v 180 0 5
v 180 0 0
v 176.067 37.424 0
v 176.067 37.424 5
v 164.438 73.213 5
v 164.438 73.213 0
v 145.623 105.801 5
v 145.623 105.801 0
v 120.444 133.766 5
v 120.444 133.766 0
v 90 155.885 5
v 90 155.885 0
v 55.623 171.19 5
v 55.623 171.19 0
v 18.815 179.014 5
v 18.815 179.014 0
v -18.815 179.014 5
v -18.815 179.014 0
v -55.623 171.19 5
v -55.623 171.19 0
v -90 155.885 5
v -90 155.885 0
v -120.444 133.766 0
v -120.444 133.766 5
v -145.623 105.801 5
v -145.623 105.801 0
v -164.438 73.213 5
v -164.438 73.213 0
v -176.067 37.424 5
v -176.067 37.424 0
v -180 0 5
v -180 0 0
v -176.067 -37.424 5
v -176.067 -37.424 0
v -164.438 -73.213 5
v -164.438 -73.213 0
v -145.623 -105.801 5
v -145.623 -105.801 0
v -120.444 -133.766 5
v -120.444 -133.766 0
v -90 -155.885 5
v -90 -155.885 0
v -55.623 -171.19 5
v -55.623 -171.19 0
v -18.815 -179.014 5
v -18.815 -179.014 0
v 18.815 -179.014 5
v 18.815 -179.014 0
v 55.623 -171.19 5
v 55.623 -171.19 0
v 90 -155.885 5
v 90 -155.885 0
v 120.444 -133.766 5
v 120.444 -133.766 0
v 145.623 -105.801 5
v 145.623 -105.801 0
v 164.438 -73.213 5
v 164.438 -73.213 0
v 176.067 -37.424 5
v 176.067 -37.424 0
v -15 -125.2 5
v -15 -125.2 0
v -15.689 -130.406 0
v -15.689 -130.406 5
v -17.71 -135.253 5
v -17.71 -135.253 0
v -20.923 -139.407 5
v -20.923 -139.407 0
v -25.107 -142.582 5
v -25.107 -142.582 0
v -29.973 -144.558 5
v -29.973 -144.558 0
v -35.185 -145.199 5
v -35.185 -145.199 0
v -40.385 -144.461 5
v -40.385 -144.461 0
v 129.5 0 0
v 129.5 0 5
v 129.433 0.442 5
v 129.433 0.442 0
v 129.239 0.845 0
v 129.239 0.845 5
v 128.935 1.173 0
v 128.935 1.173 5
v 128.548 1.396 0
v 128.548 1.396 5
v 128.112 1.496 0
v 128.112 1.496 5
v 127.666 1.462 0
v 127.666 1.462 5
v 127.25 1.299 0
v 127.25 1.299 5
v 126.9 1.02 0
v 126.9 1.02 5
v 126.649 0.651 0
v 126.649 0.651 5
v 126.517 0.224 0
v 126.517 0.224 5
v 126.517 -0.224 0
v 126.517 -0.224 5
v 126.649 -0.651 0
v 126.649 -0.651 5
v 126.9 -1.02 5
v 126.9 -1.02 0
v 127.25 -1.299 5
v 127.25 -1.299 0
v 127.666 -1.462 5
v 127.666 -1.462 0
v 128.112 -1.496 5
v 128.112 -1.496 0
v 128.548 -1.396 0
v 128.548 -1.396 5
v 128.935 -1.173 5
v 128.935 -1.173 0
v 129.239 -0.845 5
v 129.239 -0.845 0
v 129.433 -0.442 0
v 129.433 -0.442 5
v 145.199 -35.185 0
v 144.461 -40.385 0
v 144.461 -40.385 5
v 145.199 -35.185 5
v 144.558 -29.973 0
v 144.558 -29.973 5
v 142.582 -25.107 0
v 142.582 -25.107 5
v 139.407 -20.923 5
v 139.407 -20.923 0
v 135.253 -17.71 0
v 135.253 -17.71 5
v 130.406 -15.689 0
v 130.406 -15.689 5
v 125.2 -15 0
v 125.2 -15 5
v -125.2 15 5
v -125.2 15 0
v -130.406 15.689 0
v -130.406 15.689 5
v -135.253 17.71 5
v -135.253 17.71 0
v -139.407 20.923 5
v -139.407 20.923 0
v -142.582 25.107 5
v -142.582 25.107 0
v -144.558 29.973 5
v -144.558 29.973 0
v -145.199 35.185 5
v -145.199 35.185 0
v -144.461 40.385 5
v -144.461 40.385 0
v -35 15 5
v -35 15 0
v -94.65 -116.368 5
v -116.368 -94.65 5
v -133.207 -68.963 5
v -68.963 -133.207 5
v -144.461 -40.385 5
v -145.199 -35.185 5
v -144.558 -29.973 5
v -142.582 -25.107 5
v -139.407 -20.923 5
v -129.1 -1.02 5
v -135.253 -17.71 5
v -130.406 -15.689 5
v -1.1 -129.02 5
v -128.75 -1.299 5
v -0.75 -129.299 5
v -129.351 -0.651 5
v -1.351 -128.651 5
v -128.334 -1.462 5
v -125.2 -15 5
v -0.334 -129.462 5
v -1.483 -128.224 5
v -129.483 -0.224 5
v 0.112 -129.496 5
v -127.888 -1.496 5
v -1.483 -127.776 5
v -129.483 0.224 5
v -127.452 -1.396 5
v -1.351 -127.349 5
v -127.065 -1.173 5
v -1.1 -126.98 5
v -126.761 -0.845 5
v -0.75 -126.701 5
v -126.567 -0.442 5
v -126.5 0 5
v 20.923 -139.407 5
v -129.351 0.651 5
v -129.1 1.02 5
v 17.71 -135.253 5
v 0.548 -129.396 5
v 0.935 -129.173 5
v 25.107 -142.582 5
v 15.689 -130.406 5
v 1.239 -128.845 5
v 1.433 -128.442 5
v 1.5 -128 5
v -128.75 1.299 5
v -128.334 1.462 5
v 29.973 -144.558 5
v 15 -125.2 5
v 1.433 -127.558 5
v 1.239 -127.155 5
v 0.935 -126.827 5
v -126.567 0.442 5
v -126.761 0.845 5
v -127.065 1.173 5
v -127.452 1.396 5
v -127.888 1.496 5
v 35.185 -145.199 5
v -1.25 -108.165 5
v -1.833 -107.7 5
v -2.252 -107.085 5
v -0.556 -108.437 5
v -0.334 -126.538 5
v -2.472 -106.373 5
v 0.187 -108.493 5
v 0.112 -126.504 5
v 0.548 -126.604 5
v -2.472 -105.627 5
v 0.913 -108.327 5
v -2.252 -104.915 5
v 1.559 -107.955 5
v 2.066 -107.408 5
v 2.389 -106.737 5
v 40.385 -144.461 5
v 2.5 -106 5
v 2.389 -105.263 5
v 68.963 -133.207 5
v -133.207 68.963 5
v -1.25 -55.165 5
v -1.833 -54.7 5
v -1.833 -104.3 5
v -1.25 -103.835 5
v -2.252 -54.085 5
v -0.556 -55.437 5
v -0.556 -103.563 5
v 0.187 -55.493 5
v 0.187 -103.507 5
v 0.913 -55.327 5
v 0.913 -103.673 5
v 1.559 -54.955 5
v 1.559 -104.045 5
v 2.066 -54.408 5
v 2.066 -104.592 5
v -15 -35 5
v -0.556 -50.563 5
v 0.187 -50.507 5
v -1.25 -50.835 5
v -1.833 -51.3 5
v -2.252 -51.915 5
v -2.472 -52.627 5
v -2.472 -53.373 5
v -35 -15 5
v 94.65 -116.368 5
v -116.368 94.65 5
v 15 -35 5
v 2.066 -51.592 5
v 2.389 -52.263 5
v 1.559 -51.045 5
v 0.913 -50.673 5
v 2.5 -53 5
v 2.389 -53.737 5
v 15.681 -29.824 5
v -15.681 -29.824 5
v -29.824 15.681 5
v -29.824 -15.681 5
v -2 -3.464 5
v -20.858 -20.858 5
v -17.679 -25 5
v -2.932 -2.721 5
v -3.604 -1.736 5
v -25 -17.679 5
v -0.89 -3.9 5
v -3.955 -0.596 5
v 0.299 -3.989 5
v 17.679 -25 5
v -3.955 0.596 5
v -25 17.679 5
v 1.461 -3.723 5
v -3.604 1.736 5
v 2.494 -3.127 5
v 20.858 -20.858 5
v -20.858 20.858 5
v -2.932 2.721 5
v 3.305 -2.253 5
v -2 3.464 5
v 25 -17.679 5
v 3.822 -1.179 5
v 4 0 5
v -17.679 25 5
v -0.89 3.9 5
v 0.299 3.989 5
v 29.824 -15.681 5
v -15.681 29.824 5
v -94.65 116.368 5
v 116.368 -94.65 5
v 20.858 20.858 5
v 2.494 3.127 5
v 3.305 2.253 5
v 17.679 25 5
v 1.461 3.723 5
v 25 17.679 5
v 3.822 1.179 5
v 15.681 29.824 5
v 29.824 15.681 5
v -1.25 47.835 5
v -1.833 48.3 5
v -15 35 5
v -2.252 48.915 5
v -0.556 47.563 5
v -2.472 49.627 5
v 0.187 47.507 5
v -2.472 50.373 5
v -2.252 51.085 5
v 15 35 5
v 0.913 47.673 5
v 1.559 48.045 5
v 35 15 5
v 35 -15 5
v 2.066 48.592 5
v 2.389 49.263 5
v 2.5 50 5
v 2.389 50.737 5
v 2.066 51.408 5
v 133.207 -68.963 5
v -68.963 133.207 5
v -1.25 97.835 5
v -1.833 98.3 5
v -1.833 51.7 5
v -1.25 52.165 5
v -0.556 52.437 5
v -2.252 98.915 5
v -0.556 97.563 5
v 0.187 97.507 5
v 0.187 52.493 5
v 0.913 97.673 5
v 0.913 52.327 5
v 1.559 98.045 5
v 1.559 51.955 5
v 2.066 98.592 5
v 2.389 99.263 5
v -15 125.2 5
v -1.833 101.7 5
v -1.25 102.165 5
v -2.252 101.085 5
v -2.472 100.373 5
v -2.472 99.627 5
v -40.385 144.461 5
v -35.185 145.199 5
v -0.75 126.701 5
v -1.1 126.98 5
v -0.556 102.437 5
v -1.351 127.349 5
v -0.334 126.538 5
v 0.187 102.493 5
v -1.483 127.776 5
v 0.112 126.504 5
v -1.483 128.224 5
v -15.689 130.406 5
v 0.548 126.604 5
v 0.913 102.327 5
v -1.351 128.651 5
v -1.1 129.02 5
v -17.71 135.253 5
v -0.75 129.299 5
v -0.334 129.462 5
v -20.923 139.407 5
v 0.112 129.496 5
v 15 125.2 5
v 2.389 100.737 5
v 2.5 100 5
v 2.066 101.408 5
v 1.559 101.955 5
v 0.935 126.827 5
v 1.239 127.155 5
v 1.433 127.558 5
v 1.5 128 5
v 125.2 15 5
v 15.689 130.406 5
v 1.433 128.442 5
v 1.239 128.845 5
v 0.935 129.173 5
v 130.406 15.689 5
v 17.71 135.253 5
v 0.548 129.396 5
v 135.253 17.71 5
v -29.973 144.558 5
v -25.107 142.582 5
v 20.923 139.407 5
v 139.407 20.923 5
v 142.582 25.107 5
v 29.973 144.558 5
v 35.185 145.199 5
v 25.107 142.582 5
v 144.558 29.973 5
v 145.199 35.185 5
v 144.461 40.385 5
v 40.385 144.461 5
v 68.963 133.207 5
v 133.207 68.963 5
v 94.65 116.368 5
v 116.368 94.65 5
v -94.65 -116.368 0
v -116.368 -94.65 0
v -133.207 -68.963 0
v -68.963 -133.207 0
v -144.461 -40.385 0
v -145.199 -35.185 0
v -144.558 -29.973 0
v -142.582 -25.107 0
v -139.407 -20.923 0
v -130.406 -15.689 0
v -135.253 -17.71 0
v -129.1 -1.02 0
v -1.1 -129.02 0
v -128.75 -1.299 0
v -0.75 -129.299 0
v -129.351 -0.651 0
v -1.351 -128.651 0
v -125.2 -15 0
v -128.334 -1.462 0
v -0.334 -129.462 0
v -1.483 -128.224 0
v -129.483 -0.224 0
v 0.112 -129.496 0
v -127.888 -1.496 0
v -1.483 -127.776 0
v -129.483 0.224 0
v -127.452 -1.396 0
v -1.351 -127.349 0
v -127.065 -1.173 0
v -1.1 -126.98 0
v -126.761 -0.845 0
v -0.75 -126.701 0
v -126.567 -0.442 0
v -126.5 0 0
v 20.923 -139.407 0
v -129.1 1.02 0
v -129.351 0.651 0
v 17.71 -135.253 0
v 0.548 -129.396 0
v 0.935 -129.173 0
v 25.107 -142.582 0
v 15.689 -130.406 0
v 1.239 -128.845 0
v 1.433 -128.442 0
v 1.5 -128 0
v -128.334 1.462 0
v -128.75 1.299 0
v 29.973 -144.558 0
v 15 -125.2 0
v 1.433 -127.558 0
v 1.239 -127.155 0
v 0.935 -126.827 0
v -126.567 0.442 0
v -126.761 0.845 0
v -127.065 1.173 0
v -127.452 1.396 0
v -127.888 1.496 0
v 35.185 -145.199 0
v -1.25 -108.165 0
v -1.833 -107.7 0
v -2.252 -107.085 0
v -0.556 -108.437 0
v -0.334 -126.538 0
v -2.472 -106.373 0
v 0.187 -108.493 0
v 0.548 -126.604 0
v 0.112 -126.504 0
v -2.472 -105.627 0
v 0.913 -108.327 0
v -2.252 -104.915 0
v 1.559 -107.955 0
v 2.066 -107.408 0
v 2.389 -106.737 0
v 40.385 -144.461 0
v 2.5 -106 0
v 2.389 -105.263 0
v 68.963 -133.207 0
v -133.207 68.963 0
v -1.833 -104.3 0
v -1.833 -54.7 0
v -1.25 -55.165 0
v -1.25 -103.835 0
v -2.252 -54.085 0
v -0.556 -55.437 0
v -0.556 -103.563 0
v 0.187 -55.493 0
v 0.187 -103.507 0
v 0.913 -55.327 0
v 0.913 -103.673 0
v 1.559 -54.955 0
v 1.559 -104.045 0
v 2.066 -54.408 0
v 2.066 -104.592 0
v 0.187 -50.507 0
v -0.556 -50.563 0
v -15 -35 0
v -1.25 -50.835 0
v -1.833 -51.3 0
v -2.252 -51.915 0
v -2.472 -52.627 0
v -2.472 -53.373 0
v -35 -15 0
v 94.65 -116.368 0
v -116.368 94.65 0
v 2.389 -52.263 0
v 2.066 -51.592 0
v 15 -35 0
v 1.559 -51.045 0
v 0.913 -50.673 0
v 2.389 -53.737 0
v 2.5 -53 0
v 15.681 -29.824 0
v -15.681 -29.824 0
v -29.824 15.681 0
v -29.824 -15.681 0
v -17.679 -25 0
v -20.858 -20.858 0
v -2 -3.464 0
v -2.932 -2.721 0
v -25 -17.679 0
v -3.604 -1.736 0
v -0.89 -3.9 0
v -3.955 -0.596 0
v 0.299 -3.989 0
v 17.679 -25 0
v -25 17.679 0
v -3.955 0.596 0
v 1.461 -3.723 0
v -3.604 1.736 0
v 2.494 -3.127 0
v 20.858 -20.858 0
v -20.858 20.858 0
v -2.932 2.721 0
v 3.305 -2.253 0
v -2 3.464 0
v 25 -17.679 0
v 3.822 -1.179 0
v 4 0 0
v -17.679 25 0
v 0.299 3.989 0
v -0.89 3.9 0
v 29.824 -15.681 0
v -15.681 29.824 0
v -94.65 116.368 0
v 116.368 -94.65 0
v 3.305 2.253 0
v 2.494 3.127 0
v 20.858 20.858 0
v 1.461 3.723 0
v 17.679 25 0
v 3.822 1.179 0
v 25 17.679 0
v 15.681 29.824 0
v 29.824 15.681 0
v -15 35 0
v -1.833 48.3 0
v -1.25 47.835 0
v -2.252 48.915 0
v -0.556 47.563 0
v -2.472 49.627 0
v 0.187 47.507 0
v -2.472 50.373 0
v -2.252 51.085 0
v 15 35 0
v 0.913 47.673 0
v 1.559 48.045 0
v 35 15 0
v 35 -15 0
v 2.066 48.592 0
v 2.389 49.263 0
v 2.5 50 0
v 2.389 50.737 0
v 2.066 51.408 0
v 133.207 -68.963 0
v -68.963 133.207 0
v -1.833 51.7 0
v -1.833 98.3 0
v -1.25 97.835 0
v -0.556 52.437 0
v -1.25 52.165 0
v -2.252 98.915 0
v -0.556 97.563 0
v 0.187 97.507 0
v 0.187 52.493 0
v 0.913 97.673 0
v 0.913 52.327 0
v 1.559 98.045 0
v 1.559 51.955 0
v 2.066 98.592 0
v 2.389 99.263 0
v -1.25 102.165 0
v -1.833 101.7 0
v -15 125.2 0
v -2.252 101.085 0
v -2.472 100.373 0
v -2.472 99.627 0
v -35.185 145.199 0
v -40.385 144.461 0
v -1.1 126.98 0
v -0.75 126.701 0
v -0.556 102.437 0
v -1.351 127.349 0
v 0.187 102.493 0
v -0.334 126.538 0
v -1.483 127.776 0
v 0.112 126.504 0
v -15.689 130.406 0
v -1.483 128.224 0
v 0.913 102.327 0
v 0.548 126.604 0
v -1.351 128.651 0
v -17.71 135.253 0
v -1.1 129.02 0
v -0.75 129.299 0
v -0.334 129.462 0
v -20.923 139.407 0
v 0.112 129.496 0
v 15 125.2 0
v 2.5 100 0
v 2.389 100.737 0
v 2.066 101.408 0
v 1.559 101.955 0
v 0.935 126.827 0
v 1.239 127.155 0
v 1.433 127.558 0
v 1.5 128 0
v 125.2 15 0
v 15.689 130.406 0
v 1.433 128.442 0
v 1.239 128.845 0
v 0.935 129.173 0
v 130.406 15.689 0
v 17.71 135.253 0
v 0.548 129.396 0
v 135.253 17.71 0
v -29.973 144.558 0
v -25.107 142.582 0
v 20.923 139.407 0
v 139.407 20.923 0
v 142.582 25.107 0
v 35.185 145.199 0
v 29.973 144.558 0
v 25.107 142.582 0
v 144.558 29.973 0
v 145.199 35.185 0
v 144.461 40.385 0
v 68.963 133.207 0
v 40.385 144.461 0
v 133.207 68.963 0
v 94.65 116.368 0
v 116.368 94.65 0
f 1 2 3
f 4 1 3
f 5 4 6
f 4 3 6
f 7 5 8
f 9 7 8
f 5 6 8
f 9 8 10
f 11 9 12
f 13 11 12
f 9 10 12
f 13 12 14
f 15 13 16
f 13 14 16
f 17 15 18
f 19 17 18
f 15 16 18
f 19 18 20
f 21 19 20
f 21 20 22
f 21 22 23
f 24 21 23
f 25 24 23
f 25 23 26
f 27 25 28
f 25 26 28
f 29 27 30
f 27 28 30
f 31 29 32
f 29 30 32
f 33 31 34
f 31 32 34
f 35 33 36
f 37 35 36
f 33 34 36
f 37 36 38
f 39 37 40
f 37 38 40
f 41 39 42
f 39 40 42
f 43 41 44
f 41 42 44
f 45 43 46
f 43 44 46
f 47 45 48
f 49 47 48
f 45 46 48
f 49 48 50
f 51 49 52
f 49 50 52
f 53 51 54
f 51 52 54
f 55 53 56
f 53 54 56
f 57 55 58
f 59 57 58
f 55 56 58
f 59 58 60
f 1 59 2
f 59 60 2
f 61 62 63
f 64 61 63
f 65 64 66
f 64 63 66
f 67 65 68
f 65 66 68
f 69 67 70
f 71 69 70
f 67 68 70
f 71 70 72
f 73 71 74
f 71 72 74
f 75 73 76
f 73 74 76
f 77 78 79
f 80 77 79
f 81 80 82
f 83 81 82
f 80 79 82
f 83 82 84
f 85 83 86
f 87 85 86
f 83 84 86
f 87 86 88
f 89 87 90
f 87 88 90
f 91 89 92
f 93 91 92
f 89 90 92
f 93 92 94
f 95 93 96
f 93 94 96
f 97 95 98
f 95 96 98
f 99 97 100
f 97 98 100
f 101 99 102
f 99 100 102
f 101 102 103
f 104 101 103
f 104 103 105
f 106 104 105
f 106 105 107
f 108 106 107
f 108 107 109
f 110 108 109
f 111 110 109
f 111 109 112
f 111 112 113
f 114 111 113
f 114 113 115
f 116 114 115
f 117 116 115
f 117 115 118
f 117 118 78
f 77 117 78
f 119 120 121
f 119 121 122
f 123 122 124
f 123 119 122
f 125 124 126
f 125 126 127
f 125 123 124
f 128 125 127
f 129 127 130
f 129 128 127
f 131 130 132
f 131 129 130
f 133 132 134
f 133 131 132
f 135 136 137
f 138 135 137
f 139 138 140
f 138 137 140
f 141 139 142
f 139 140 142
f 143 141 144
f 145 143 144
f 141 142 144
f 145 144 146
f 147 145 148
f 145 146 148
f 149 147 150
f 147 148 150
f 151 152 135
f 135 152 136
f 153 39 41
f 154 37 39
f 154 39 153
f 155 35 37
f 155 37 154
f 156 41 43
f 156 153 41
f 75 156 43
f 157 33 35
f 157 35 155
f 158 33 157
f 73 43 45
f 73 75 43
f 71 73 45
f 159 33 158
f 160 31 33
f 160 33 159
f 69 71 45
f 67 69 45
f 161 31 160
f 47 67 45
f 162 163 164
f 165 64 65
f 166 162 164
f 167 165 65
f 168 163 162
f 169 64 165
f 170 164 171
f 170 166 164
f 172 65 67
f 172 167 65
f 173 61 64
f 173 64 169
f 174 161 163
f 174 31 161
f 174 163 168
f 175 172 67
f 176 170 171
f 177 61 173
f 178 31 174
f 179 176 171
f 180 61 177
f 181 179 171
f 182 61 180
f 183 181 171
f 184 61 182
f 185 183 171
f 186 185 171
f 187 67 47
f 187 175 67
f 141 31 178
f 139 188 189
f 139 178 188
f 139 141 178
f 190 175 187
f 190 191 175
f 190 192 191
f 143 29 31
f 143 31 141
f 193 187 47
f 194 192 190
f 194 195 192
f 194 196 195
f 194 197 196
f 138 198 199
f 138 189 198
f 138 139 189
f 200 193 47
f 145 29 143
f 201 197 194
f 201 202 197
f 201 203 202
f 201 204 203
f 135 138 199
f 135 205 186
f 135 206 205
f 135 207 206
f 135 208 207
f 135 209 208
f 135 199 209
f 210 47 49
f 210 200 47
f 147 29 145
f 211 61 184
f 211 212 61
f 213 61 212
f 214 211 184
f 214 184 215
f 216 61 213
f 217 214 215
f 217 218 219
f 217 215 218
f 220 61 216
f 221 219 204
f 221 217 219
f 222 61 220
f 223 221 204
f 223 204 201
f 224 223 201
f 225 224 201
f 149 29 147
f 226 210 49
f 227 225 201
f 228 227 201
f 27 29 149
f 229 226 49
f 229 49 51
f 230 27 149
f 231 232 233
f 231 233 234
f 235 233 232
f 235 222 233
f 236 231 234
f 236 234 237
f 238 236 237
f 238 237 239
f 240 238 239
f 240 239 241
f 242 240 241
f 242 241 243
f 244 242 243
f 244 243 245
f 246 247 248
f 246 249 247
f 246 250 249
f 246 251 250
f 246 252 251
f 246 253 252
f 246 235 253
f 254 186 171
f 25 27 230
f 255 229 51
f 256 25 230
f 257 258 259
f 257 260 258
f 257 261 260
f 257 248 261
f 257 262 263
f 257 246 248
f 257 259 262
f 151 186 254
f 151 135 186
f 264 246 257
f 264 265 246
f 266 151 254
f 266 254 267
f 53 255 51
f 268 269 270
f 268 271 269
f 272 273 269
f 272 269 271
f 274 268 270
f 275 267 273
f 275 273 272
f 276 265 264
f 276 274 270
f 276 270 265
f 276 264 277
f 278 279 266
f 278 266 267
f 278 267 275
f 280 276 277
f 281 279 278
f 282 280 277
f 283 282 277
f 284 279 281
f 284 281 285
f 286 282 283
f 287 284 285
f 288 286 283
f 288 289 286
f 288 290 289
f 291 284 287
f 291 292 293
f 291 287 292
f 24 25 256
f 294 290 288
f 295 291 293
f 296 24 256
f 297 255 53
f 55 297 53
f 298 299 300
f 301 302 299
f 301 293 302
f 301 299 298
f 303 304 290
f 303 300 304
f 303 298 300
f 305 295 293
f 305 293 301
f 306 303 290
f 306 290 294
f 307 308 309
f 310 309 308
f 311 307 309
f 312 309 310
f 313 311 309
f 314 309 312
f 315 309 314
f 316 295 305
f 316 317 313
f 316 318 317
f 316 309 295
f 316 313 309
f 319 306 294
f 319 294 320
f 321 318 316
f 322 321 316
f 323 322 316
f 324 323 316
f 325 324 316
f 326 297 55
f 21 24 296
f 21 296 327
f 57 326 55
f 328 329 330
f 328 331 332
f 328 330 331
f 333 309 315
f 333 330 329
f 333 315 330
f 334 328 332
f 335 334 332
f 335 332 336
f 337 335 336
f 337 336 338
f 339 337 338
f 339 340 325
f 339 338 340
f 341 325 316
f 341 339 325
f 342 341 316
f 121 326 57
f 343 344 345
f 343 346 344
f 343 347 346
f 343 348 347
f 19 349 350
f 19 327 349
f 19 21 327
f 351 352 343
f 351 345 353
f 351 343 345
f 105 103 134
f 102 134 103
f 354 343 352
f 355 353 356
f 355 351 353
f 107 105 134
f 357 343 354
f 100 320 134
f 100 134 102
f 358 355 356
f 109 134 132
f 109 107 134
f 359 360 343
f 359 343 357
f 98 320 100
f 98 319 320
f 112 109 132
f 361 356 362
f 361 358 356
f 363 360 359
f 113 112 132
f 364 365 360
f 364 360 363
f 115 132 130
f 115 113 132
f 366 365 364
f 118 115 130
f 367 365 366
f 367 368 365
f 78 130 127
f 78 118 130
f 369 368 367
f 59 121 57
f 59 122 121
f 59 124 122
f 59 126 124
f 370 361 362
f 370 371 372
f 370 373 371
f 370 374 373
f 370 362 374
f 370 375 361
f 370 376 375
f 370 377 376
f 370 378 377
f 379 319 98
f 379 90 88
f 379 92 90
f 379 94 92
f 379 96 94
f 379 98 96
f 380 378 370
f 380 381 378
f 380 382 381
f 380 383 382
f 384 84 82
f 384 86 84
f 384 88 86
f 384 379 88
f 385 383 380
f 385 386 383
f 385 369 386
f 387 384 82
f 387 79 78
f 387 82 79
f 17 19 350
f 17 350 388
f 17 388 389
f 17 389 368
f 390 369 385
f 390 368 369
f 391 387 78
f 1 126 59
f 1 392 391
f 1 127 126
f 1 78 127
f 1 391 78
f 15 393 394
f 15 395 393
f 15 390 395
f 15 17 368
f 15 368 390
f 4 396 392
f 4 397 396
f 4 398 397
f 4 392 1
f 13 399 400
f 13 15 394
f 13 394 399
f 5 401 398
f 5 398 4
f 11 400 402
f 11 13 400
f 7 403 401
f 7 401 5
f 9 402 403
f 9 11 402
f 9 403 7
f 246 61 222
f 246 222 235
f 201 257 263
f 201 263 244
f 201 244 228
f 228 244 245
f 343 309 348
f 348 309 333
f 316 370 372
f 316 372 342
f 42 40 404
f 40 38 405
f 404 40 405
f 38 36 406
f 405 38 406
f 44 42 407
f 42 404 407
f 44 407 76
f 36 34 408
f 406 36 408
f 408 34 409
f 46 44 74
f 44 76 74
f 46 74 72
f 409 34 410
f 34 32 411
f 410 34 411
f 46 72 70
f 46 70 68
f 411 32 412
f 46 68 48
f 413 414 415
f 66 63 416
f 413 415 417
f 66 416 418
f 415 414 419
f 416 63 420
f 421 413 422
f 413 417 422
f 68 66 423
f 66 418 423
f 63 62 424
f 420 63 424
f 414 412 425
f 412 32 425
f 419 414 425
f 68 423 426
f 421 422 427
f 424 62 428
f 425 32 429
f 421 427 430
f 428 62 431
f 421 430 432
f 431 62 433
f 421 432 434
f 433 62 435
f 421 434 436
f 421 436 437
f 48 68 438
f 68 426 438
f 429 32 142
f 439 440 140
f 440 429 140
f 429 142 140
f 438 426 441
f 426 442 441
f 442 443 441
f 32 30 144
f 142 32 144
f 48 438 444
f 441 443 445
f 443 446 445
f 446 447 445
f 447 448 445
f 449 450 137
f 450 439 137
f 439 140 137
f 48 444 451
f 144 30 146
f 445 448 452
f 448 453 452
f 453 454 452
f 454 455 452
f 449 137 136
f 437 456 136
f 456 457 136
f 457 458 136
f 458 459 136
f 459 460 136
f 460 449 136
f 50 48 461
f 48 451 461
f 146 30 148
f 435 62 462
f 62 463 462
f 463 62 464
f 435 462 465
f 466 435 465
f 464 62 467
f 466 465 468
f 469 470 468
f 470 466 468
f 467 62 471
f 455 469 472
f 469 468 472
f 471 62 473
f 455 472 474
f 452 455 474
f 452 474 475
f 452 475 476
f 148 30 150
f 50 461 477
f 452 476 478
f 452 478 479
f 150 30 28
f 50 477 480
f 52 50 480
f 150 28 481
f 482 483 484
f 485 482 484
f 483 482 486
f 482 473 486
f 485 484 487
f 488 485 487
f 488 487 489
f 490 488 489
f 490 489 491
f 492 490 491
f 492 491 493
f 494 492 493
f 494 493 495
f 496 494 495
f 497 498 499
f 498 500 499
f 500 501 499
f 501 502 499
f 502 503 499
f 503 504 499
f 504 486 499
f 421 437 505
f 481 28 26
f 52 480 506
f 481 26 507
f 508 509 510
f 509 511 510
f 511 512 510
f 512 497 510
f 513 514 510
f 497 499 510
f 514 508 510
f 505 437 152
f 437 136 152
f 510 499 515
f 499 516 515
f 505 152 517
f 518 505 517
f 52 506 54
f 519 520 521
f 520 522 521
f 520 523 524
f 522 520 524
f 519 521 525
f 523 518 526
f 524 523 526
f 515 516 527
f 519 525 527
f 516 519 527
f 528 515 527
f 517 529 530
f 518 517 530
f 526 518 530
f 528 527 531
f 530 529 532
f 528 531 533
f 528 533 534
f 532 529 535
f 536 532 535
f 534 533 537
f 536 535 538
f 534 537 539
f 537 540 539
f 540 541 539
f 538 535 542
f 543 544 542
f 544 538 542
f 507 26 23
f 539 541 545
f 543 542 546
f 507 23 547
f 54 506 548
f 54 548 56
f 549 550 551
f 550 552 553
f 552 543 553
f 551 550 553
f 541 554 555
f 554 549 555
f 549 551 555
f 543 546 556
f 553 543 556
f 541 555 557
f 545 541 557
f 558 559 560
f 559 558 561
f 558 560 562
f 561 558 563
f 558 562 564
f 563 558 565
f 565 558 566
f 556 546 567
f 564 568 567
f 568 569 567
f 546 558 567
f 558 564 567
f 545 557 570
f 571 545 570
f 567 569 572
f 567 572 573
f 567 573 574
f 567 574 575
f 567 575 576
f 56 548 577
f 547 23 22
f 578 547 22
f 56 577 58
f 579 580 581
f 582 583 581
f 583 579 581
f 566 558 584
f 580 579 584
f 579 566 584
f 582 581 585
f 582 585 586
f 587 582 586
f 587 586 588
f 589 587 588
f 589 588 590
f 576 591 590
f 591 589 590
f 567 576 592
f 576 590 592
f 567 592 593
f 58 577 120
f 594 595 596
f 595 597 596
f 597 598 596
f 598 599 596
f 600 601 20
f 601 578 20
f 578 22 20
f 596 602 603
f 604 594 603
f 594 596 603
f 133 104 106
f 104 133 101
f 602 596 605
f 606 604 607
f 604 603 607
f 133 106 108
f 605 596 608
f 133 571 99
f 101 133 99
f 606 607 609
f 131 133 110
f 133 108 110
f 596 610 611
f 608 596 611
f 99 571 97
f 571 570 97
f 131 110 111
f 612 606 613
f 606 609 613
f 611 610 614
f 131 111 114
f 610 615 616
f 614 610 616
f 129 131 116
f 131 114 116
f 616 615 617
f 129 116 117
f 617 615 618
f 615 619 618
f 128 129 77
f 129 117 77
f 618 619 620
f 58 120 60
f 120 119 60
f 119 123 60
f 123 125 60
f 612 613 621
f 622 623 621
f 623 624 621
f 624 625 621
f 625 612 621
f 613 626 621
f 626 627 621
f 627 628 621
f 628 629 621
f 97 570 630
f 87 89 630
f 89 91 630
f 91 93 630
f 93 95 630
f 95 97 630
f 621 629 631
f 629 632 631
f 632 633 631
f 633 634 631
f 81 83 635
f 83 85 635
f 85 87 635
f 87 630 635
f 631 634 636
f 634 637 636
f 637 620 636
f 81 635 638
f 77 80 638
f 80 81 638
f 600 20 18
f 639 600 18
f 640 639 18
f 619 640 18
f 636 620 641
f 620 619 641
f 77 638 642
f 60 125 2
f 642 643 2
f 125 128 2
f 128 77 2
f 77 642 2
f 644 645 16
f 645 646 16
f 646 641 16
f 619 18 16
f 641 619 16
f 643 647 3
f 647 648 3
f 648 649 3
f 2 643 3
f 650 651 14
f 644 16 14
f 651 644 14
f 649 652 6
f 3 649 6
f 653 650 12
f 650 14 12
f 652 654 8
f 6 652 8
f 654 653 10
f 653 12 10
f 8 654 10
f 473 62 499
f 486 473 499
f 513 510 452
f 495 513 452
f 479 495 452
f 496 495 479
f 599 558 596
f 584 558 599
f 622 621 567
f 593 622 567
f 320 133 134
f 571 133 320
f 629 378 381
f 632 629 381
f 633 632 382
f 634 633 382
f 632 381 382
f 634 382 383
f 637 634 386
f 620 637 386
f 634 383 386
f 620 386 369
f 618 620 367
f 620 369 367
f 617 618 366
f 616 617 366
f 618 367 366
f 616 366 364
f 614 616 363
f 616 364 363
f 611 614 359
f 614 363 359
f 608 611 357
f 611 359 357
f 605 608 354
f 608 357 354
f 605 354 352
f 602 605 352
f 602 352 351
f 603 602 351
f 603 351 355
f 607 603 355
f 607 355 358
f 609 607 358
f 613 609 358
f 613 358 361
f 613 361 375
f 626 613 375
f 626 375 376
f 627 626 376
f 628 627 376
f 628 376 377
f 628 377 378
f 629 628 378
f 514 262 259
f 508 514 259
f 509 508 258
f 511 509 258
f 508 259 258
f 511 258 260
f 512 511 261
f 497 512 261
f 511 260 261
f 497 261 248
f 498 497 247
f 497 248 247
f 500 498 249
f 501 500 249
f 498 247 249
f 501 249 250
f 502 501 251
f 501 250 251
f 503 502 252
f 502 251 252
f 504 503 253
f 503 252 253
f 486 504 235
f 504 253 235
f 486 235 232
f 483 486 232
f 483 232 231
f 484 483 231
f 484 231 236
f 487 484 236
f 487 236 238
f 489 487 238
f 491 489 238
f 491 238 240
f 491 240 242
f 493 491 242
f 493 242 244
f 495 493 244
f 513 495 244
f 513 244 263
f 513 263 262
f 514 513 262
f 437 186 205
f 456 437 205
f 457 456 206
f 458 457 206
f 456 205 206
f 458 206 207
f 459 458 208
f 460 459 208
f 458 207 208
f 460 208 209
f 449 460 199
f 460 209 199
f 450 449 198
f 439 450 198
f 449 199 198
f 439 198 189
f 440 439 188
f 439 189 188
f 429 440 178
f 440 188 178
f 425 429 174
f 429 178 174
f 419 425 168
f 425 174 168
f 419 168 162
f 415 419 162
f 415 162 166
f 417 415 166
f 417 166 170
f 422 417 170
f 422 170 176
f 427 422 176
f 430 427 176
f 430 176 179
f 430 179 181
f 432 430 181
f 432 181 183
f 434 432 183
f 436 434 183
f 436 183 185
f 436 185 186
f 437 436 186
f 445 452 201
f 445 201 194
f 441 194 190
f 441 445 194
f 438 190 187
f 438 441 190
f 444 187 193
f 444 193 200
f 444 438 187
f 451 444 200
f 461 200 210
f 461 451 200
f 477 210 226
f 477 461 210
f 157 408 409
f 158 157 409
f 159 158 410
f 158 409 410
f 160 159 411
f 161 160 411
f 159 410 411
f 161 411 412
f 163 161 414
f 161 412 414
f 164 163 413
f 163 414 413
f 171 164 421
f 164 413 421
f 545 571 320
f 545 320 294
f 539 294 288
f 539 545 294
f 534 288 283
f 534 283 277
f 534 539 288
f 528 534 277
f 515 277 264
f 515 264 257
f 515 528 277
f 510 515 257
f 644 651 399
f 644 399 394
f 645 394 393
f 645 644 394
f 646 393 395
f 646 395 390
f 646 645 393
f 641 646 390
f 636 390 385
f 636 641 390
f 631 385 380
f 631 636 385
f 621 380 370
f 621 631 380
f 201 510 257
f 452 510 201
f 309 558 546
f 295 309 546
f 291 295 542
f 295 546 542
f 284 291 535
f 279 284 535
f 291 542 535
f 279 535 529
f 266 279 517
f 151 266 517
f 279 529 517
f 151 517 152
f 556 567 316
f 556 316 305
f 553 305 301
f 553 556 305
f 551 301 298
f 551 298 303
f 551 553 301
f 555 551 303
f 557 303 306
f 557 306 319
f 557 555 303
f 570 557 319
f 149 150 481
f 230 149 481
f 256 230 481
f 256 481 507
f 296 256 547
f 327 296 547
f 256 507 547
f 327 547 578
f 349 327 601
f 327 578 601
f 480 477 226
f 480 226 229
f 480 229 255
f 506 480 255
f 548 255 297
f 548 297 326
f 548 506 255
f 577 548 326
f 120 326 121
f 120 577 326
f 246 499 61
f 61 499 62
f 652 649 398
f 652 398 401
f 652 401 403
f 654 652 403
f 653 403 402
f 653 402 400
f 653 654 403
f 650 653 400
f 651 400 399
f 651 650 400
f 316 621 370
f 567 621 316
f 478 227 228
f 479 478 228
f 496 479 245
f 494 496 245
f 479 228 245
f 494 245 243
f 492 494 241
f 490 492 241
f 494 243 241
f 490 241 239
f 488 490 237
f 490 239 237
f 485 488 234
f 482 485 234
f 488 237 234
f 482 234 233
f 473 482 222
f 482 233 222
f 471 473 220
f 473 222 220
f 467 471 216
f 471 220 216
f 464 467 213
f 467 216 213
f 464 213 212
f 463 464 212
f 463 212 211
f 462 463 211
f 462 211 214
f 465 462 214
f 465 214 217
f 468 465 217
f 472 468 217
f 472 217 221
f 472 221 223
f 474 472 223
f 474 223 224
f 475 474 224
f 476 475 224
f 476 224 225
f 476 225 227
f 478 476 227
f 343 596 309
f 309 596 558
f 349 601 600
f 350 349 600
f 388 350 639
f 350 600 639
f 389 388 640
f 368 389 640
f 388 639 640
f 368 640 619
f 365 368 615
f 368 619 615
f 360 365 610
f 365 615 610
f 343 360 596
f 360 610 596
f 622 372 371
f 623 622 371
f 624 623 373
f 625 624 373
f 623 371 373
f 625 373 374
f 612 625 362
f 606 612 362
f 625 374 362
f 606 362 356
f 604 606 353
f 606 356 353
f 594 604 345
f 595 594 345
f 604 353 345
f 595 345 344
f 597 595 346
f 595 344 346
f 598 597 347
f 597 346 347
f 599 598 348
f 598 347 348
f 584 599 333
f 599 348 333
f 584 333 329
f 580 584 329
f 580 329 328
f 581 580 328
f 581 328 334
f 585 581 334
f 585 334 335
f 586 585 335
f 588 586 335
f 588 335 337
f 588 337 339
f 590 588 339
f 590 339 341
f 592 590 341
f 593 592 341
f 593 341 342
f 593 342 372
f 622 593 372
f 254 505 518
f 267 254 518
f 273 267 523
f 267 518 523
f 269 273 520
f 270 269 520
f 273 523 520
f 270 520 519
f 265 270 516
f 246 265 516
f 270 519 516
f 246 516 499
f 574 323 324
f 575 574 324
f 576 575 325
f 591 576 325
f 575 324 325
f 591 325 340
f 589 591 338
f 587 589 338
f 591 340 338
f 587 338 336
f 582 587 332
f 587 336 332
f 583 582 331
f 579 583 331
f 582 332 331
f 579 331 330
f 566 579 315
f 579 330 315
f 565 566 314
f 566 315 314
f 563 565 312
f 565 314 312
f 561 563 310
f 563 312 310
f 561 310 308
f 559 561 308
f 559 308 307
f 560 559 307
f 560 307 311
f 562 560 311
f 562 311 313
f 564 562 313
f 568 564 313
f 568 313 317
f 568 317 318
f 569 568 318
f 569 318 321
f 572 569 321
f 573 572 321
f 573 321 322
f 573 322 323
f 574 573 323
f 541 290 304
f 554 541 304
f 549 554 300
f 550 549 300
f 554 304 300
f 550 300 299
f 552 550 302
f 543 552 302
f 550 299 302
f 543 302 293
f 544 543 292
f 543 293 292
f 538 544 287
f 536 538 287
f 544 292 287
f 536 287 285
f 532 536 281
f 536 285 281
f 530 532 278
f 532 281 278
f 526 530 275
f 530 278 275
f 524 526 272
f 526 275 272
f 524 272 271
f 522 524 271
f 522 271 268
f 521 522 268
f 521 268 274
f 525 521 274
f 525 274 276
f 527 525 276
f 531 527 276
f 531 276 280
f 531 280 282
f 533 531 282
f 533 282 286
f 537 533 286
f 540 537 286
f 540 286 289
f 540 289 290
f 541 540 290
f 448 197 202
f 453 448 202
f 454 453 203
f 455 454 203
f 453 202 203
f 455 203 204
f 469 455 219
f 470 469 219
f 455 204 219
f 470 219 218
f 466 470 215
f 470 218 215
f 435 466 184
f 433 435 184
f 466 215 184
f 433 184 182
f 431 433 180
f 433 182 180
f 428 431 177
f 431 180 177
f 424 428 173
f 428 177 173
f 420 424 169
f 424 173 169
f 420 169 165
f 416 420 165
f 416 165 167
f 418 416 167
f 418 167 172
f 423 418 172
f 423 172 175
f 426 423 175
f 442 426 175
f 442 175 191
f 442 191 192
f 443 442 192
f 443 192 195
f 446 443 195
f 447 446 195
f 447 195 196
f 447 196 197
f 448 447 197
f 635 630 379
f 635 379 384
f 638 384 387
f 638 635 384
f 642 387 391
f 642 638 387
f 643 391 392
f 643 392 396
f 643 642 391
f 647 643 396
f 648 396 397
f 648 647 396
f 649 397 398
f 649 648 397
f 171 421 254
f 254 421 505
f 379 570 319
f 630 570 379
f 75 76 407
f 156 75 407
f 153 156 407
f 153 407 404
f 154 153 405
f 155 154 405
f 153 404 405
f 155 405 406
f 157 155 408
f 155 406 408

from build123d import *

# Parameters (mm, degrees)
SKETCH1_R           = 180
BOSS_EXTRUDE1_DEPTH = 5
SKETCH2_R           = 4
CUT_EXTRUDE1_DEPTH  = 6
SKETCH3_R           = 2.5
CUT_EXTRUDE2_DEPTH  = 6
SKETCH4_R           = 1.5
CUT_EXTRUDE3_DEPTH  = 6


with BuildPart() as part:
    # Sketch1 → Boss-Extrude1 (new body)
    with BuildSketch(Plane.XY):
        Circle(SKETCH1_R)
        with BuildLine():
            Line((-15, 125.199840255), (-15, 35))
            ThreePointArc((-15, 35), (-20.857864376, 20.857864376), (-35, 15))
            Line((-35, 15), (-125.199840255, 15))
            ThreePointArc((-125.199840255, 15), (-141.132390392, 22.910589503), (-144.461354141, 40.384615385))
            ThreePointArc((-144.461354141, 40.384615385), (-106.066017178, 106.066017178), (-40.384615385, 144.461354141))
            ThreePointArc((-40.384615385, 144.461354141), (-22.910589503, 141.132390392), (-15, 125.199840255))
        make_face(mode=Mode.SUBTRACT)
        with BuildLine():
            Line((15, 125.199840255), (15, 35))
            ThreePointArc((15, 35), (20.857864376, 20.857864376), (35, 15))
            Line((35, 15), (125.199840255, 15))
            ThreePointArc((125.199840255, 15), (141.132390392, 22.910589503), (144.461354141, 40.384615385))
            ThreePointArc((144.461354141, 40.384615385), (106.066017178, 106.066017178), (40.384615385, 144.461354141))
            ThreePointArc((40.384615385, 144.461354141), (22.910589503, 141.132390392), (15, 125.199840255))
        make_face(mode=Mode.SUBTRACT)
        with BuildLine():
            Line((125.199840255, -15), (35, -15))
            ThreePointArc((35, -15), (20.857864376, -20.857864376), (15, -35))
            Line((15, -35), (15, -125.199840255))
            ThreePointArc((15, -125.199840255), (22.910589503, -141.132390392), (40.384615385, -144.461354141))
            ThreePointArc((40.384615385, -144.461354141), (106.066017178, -106.066017178), (144.461354141, -40.384615385))
            ThreePointArc((144.461354141, -40.384615385), (141.132390392, -22.910589503), (125.199840255, -15))
        make_face(mode=Mode.SUBTRACT)
        with BuildLine():
            Line((-15, -35), (-15, -125.199840255))
            ThreePointArc((-15, -125.199840255), (-22.910589503, -141.132390392), (-40.384615385, -144.461354141))
            ThreePointArc((-40.384615385, -144.461354141), (-106.066017178, -106.066017178), (-144.461354141, -40.384615385))
            ThreePointArc((-144.461354141, -40.384615385), (-141.132390392, -22.910589503), (-125.199840255, -15))
            Line((-125.199840255, -15), (-35, -15))
            ThreePointArc((-35, -15), (-20.857864376, -20.857864376), (-15, -35))
        make_face(mode=Mode.SUBTRACT)
    extrude(amount=BOSS_EXTRUDE1_DEPTH)

    # Sketch2 → Cut-Extrude1 (cut, through all)
    with BuildSketch(Plane.XY.offset(5)):
        Circle(SKETCH2_R)
    extrude(amount=-CUT_EXTRUDE1_DEPTH, mode=Mode.SUBTRACT)

    # Sketch3 → Cut-Extrude2 (cut, through all)
    with BuildSketch(Plane.XY.offset(5)):
        with Locations((0, 50)):
            Circle(SKETCH3_R)
        with Locations((0, 100)):
            Circle(SKETCH3_R)
        with Locations((0, -53)):
            Circle(SKETCH3_R)
        with Locations((0, -106)):
            Circle(SKETCH3_R)
    extrude(amount=-CUT_EXTRUDE2_DEPTH, mode=Mode.SUBTRACT)

    # Sketch4 → Cut-Extrude3 (cut, through all)
    with BuildSketch(Plane.XY.offset(5)):
        with Locations((0, 128)):
            Circle(SKETCH4_R)
        with Locations((128, 0)):
            Circle(SKETCH4_R)
        with Locations((0, -128)):
            Circle(SKETCH4_R)
        with Locations((-128, 0)):
            Circle(SKETCH4_R)
    extrude(amount=-CUT_EXTRUDE3_DEPTH, mode=Mode.SUBTRACT)


solid = part.part
